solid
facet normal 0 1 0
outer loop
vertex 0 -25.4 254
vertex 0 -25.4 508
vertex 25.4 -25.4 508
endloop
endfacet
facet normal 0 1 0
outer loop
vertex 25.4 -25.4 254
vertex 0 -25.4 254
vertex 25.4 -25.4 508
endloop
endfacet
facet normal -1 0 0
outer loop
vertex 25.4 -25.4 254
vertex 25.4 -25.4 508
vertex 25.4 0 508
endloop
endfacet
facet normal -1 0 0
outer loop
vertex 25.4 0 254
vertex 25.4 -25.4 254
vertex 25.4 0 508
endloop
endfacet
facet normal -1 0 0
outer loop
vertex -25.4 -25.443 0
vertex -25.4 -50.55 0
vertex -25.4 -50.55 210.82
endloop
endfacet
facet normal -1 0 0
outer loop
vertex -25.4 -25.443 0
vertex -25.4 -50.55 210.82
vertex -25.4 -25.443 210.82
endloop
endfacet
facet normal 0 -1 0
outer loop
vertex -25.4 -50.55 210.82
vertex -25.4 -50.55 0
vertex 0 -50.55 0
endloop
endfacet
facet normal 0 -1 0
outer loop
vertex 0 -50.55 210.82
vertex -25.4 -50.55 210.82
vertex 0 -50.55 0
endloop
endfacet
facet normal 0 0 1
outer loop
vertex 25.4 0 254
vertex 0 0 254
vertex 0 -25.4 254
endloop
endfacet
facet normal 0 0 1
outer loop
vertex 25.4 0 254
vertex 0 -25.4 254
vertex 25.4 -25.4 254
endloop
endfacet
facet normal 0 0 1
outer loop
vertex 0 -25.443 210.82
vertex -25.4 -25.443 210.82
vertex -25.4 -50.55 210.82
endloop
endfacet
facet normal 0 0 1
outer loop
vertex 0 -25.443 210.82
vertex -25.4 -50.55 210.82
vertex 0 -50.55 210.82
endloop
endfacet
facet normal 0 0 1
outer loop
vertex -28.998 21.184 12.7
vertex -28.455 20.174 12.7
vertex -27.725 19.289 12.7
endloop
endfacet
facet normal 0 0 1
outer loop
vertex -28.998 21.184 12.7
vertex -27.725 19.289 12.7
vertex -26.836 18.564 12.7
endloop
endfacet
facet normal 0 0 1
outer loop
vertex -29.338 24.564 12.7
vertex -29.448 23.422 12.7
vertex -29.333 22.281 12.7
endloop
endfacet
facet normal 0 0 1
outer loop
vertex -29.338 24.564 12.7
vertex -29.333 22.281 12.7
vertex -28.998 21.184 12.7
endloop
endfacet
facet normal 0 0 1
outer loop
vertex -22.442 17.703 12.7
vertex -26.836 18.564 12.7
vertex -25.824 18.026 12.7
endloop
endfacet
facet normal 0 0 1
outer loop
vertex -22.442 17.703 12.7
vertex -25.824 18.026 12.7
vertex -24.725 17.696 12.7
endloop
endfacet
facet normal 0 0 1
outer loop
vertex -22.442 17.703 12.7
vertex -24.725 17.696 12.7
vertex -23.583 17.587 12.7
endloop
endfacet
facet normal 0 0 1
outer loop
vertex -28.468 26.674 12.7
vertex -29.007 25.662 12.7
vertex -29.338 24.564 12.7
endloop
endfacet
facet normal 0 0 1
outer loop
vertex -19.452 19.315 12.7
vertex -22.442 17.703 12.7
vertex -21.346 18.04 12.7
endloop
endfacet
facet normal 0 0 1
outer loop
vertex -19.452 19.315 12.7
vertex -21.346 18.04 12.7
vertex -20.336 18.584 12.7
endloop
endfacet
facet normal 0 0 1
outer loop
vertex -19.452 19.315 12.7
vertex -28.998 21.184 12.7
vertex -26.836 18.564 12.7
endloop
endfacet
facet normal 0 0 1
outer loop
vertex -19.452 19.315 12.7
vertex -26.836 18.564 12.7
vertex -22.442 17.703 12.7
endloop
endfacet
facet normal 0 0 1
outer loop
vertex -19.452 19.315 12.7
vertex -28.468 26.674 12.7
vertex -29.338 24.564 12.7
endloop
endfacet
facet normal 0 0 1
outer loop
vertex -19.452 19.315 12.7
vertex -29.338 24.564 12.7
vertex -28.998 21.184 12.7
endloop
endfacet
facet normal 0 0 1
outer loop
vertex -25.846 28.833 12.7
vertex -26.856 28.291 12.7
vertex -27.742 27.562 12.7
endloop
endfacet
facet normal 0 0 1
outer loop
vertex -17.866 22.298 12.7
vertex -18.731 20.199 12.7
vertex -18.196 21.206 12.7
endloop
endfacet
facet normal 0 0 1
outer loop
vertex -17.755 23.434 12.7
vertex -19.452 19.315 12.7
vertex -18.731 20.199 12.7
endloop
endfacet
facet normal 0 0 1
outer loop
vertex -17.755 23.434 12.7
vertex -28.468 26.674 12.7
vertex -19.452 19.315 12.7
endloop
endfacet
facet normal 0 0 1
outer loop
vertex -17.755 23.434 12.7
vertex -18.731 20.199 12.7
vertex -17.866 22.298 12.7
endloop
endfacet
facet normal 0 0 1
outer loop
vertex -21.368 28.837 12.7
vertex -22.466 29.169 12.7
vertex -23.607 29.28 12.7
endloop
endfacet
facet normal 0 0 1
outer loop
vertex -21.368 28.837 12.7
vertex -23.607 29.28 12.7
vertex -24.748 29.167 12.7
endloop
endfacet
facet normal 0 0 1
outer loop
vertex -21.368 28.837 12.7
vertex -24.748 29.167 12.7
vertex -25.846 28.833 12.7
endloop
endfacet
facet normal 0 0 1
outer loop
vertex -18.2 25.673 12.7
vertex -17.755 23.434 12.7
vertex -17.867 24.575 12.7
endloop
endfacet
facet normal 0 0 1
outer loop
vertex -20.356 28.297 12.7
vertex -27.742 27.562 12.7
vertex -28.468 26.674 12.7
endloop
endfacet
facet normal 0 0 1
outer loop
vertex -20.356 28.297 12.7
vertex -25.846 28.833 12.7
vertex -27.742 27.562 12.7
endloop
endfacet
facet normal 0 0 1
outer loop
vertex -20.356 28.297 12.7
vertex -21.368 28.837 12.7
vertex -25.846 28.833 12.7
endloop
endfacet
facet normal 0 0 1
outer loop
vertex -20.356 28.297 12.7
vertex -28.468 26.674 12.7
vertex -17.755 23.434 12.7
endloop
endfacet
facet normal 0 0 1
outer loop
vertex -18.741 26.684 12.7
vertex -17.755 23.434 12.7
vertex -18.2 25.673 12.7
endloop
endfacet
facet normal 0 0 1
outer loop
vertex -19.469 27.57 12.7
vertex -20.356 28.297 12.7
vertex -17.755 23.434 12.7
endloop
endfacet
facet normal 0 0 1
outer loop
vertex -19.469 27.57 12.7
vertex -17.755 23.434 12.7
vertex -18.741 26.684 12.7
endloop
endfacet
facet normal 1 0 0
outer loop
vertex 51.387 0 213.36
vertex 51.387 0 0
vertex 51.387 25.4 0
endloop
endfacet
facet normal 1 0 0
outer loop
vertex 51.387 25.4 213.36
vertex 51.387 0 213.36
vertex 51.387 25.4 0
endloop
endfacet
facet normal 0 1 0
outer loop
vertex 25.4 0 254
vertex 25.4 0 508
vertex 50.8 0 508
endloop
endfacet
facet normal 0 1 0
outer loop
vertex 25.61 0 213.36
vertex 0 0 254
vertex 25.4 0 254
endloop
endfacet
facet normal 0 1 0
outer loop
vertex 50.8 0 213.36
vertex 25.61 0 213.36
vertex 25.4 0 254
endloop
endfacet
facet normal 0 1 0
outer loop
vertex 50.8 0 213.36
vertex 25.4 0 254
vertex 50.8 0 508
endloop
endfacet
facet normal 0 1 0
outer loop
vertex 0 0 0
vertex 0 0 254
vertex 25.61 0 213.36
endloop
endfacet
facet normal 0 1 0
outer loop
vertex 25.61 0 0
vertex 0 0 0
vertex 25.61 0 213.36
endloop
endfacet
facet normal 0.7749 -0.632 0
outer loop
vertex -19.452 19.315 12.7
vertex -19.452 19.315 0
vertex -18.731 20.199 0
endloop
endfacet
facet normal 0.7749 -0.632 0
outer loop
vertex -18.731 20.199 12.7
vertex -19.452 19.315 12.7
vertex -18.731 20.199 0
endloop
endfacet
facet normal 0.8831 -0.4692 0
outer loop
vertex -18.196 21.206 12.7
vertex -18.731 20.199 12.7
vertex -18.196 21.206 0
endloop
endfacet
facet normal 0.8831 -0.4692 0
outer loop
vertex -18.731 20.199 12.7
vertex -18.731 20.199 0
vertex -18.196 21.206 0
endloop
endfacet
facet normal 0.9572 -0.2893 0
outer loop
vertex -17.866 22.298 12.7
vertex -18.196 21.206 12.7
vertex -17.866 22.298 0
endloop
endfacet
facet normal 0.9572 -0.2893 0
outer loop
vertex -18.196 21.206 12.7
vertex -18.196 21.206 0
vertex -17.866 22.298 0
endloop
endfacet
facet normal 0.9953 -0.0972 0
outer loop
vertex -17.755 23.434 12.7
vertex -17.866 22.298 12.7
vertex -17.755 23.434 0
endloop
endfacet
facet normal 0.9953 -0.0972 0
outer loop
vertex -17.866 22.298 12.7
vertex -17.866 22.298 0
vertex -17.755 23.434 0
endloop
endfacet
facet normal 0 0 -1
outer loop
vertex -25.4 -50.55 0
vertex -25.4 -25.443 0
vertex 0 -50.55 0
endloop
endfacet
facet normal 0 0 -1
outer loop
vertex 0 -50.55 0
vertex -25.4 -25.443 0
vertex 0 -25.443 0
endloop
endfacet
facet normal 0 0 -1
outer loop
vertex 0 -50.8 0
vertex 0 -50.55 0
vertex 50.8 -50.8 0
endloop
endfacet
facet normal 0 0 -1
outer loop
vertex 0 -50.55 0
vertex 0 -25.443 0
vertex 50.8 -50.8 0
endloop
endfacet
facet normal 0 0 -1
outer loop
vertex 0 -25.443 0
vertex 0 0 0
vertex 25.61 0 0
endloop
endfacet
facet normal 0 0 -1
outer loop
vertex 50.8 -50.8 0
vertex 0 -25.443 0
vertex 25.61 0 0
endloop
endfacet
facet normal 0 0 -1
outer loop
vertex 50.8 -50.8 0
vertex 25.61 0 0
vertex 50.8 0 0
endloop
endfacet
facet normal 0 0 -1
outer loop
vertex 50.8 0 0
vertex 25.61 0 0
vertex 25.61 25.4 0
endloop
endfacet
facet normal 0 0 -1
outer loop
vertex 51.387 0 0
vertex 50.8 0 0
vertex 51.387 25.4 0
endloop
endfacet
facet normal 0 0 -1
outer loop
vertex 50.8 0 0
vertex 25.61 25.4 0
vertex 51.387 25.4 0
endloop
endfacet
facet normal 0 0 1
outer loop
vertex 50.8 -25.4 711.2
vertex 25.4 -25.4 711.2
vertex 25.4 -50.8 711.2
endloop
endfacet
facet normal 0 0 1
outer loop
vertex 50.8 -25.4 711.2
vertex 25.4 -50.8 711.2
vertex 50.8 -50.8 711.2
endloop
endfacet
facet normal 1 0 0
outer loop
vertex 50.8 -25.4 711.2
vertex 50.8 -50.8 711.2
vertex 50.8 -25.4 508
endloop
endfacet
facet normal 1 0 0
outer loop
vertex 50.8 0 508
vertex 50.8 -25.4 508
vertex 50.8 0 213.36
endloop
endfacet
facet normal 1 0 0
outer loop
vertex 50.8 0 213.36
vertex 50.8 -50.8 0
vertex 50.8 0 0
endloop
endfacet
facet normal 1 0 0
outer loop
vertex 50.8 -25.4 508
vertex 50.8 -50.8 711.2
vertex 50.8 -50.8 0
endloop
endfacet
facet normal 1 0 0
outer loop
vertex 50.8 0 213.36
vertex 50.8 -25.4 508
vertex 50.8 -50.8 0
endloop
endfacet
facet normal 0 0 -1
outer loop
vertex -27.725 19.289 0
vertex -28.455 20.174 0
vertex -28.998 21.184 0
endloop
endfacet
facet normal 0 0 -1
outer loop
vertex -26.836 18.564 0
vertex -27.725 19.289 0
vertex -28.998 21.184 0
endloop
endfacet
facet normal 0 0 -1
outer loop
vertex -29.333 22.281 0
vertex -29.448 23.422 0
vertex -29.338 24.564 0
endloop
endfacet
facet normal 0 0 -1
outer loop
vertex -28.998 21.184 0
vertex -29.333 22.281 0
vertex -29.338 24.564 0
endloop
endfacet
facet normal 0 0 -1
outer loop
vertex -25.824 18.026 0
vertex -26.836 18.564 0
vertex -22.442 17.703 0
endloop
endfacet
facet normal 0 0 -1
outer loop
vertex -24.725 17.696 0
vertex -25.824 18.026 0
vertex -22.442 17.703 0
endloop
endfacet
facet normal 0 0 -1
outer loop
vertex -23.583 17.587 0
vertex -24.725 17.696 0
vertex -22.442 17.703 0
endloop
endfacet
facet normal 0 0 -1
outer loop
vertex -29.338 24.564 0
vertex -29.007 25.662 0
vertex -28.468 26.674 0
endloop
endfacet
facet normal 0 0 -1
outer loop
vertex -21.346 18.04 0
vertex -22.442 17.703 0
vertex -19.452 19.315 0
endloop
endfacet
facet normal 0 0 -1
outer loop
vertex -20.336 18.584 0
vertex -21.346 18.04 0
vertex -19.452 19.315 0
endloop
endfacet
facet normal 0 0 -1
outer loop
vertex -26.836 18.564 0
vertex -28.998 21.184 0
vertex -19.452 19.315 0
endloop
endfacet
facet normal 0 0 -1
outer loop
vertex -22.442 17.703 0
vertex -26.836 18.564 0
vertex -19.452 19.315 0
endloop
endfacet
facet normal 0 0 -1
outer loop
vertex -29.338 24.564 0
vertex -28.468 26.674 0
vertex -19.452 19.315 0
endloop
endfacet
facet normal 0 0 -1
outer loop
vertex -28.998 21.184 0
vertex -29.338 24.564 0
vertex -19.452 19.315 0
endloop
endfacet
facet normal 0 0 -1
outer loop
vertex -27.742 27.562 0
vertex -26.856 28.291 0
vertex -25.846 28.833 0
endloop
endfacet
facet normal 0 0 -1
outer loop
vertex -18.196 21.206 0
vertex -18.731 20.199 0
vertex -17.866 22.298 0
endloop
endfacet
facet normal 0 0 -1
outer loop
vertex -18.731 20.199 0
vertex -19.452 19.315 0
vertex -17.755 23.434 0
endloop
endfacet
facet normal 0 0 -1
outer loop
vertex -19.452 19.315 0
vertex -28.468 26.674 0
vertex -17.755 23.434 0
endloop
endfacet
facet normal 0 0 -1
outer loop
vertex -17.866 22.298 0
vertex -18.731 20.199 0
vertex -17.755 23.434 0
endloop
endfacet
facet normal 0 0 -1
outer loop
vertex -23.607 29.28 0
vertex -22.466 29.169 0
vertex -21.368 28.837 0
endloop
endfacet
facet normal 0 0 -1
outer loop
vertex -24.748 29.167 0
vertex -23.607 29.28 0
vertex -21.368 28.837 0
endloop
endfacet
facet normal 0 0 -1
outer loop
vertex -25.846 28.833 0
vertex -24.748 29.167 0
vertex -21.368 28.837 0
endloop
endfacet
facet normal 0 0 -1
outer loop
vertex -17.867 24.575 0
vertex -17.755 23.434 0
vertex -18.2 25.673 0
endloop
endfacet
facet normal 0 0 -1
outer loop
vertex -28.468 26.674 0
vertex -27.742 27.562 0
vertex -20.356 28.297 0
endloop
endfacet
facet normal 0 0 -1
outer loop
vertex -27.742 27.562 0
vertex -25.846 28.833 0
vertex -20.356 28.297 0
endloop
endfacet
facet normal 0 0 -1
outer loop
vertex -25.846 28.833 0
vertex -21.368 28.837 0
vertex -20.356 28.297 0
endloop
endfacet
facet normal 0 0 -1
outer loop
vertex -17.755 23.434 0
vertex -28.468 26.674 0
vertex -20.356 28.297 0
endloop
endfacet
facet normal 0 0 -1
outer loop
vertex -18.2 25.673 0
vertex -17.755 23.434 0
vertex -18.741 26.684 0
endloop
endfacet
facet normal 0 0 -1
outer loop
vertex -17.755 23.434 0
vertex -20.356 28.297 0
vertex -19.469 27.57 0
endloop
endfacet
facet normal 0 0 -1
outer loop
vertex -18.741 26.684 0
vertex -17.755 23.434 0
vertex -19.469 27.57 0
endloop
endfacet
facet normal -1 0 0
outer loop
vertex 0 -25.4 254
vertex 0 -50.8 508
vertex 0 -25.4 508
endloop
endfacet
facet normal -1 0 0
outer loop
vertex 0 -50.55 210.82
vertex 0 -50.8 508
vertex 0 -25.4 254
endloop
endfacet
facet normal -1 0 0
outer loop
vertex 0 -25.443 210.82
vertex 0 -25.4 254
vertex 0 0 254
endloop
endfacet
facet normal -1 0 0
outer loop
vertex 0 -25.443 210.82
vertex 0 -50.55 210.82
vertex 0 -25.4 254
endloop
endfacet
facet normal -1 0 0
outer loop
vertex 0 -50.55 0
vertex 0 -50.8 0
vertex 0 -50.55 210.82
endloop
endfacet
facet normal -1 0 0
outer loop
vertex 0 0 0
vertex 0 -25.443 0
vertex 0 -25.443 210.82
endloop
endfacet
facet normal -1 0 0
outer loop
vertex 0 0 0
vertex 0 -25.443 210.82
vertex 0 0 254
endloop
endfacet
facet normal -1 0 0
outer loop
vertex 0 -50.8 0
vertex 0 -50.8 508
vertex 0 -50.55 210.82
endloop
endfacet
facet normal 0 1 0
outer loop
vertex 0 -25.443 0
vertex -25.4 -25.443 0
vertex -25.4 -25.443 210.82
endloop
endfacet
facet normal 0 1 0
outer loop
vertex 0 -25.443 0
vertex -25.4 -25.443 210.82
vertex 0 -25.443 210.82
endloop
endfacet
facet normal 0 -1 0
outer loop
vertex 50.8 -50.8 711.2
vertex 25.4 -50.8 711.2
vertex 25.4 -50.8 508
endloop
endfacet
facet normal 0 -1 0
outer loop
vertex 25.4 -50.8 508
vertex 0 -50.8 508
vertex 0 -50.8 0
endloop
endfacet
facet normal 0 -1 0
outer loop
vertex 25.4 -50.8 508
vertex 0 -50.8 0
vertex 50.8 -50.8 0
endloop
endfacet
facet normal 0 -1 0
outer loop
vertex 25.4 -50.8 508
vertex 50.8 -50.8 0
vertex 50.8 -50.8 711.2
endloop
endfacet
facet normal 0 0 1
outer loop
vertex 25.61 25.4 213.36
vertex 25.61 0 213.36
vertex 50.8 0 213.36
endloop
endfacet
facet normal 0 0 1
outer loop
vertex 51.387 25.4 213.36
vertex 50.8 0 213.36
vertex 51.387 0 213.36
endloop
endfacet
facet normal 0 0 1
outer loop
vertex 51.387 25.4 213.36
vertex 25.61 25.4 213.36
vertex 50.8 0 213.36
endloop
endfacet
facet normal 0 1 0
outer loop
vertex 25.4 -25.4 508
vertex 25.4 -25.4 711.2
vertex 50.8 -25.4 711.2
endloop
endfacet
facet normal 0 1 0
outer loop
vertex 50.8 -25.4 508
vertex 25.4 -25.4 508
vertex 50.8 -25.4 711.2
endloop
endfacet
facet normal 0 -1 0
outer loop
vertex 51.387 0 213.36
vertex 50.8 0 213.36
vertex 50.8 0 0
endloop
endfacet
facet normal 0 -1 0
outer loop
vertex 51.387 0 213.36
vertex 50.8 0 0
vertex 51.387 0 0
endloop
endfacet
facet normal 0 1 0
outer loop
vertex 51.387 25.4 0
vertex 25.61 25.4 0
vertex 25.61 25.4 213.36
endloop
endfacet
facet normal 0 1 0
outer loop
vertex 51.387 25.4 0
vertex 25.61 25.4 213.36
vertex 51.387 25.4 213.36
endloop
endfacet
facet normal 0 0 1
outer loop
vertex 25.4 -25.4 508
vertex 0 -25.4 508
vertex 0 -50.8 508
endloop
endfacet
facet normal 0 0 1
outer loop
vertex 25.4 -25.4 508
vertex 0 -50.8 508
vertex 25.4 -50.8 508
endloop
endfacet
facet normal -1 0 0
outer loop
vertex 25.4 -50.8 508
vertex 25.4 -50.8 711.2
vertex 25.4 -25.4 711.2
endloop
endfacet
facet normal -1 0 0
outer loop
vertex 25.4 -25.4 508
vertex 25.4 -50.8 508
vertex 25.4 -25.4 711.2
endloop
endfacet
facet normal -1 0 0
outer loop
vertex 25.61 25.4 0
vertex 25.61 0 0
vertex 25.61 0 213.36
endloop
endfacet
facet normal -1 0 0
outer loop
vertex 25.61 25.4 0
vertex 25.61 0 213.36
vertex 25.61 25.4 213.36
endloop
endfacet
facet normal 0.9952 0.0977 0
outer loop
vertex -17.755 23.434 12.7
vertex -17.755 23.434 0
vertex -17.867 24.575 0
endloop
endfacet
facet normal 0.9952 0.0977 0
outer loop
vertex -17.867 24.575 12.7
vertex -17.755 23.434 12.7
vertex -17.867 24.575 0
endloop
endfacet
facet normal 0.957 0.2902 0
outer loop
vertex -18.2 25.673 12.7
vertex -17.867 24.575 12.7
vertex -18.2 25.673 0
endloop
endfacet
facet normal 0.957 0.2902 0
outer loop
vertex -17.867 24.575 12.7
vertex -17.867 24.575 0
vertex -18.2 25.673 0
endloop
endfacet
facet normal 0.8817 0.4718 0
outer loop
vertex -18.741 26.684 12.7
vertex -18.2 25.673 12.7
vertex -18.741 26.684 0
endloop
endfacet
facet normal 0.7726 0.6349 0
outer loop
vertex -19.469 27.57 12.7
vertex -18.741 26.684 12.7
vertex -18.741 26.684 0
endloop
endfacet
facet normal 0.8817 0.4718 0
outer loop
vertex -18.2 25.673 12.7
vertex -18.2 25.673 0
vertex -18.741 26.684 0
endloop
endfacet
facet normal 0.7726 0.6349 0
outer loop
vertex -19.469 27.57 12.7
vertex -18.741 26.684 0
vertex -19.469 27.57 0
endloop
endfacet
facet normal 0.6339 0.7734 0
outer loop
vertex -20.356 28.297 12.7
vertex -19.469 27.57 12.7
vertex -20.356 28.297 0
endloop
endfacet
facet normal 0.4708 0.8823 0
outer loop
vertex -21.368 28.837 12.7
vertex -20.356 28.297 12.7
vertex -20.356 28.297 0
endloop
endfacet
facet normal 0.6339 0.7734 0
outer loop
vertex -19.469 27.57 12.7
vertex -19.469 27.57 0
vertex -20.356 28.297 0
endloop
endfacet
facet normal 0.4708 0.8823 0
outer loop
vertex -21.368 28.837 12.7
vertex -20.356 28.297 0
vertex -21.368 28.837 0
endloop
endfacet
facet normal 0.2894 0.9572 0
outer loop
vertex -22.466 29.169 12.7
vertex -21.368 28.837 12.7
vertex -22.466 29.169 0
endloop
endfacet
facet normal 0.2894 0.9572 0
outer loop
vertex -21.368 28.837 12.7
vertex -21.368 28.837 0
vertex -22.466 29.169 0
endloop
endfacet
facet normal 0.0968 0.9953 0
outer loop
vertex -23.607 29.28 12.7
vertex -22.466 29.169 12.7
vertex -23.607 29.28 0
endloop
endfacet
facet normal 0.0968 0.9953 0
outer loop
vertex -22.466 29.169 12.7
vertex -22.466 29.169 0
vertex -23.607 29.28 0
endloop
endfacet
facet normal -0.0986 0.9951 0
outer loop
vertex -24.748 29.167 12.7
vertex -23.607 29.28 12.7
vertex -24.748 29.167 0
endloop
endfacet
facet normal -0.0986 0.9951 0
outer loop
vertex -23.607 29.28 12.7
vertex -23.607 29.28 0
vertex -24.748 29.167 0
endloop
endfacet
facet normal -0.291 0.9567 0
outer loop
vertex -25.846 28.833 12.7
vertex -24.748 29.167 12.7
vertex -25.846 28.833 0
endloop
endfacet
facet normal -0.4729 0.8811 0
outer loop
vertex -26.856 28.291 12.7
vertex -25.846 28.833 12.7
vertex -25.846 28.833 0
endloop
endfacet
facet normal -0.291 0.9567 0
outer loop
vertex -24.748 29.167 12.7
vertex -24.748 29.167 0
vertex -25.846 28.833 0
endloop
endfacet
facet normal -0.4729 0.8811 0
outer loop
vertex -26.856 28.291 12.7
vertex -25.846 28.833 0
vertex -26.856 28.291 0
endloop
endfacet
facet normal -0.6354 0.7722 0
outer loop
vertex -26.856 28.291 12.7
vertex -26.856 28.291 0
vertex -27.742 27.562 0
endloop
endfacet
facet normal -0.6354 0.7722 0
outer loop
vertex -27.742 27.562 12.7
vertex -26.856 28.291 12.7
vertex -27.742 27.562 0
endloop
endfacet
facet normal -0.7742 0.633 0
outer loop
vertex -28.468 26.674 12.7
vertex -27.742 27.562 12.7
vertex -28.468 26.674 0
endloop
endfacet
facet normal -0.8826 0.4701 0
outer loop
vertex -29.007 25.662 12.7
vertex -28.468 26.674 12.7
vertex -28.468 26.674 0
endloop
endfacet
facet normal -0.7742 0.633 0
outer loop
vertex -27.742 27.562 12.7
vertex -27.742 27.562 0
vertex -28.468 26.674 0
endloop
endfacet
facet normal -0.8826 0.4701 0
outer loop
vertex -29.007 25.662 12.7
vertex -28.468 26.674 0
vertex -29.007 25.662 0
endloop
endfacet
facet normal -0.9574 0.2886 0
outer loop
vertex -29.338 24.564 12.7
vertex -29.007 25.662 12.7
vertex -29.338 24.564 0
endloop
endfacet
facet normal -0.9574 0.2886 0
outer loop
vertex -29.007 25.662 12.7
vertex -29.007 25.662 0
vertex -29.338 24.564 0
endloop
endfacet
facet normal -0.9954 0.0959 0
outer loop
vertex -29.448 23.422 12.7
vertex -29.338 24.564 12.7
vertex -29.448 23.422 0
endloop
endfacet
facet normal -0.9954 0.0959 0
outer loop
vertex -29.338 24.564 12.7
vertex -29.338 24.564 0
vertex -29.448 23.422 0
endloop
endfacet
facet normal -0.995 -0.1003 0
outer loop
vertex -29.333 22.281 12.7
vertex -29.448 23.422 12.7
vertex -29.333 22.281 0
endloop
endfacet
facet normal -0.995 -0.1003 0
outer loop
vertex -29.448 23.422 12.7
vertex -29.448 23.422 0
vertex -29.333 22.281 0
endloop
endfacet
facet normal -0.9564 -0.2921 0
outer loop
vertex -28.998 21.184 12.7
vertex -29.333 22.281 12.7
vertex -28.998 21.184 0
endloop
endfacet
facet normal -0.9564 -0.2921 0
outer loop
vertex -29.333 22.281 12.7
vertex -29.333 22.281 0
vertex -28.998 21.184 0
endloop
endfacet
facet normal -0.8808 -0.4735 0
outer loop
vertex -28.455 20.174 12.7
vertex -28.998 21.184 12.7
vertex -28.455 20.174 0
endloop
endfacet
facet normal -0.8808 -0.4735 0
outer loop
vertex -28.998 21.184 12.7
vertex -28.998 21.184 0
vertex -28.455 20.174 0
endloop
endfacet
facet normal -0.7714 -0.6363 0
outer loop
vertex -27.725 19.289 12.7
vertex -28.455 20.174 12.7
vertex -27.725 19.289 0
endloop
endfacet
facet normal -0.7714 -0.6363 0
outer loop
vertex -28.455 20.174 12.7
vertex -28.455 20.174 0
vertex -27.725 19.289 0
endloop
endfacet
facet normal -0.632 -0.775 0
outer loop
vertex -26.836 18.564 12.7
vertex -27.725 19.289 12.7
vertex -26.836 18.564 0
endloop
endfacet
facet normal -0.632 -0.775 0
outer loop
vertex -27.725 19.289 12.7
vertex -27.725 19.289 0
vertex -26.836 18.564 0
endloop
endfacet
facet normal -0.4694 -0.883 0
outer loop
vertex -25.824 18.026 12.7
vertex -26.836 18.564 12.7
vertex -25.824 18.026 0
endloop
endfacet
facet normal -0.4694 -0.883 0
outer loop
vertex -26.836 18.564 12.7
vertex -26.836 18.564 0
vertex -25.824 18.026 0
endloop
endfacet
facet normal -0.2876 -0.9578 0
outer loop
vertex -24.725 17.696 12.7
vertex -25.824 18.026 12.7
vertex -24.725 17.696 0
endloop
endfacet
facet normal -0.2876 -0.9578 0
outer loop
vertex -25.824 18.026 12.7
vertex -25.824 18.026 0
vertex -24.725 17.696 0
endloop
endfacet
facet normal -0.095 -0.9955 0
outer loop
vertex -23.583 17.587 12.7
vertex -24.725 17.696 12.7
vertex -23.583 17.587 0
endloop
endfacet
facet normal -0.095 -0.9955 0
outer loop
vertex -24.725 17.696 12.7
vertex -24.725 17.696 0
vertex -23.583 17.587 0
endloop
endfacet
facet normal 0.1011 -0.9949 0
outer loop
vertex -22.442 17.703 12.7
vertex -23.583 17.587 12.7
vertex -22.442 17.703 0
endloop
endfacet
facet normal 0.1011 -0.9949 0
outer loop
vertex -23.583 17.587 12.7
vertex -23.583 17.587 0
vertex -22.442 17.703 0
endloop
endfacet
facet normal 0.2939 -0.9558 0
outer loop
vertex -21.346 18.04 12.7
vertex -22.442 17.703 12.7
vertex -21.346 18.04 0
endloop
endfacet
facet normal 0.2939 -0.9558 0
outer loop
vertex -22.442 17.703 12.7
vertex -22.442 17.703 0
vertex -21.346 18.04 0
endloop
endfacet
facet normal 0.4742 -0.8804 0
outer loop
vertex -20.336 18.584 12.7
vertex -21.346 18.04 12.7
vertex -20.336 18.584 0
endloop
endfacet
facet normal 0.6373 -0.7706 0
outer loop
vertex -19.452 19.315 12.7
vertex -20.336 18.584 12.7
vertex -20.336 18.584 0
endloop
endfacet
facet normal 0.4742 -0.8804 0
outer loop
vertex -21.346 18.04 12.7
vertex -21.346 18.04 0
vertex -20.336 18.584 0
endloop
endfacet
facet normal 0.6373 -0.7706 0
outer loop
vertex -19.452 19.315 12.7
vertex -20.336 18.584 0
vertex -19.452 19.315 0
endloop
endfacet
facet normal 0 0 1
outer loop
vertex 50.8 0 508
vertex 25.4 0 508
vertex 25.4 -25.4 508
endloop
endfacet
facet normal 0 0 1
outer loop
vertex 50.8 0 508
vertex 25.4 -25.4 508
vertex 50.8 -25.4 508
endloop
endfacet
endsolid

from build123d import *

# Parameters (mm, degrees)
F0_W      = 50.8
F0_H      = 50.8
F1_DEPTH  = 508
F2_W      = 25.4
F2_H      = 25.4
F3_DEPTH  = 254
F4_W      = 25.4
F4_H      = 25.4
F5_DEPTH  = 203.2
F6_W      = 25.777278
F6_H      = 25.4
F7_DEPTH  = 213.36
F8_W      = 25.4
F8_H      = 25.107741
F9_DEPTH  = 210.82
F11_DEPTH = 12.7


with BuildPart() as f1:
    # F0 (on Top) → F1 (new body)
    with BuildSketch(Plane.XY):
        with Locations((25.4, -25.4)):
            Rectangle(F0_W, F0_H)
    extrude(amount=F1_DEPTH)

    # F2 (on face) → F3 (cut)
    with BuildSketch(Plane.XY.offset(508)):
        with Locations((12.7, -12.7)):
            Rectangle(F2_W, F2_H)
    extrude(amount=-F3_DEPTH, mode=Mode.SUBTRACT)

    # F4 (on face) → F5 (join)
    with BuildSketch(Plane.XY.offset(508)):
        with Locations((38.1, -38.1)):
            Rectangle(F4_W, F4_H)
    extrude(amount=F5_DEPTH)

    # F6 (on Top) → F7 (join)
    with BuildSketch(Plane.XY):
        with Locations((38.498533, 12.7)):
            Rectangle(F6_W, F6_H)
    extrude(amount=F7_DEPTH)

    # F8 (on Top) → F9 (join)
    with BuildSketch(Plane.XY):
        with Locations((-12.7, -37.996381)):
            Rectangle(F8_W, F8_H)
    extrude(amount=F9_DEPTH)


with BuildPart() as f11:
    # F10 (on Top) → F11 (new body)
    with BuildSketch(Plane.XY):
        with BuildLine():
            ThreePointArc((-19.452488, 19.314527), (-18.195838, 21.206146), (-17.754772, 23.433892))
            ThreePointArc((-17.754772, 23.433892), (-29.006716, 25.661638), (-19.452488, 19.314527))
        make_face()
    extrude(amount=F11_DEPTH)


solid = Compound([f1.part, f11.part])
